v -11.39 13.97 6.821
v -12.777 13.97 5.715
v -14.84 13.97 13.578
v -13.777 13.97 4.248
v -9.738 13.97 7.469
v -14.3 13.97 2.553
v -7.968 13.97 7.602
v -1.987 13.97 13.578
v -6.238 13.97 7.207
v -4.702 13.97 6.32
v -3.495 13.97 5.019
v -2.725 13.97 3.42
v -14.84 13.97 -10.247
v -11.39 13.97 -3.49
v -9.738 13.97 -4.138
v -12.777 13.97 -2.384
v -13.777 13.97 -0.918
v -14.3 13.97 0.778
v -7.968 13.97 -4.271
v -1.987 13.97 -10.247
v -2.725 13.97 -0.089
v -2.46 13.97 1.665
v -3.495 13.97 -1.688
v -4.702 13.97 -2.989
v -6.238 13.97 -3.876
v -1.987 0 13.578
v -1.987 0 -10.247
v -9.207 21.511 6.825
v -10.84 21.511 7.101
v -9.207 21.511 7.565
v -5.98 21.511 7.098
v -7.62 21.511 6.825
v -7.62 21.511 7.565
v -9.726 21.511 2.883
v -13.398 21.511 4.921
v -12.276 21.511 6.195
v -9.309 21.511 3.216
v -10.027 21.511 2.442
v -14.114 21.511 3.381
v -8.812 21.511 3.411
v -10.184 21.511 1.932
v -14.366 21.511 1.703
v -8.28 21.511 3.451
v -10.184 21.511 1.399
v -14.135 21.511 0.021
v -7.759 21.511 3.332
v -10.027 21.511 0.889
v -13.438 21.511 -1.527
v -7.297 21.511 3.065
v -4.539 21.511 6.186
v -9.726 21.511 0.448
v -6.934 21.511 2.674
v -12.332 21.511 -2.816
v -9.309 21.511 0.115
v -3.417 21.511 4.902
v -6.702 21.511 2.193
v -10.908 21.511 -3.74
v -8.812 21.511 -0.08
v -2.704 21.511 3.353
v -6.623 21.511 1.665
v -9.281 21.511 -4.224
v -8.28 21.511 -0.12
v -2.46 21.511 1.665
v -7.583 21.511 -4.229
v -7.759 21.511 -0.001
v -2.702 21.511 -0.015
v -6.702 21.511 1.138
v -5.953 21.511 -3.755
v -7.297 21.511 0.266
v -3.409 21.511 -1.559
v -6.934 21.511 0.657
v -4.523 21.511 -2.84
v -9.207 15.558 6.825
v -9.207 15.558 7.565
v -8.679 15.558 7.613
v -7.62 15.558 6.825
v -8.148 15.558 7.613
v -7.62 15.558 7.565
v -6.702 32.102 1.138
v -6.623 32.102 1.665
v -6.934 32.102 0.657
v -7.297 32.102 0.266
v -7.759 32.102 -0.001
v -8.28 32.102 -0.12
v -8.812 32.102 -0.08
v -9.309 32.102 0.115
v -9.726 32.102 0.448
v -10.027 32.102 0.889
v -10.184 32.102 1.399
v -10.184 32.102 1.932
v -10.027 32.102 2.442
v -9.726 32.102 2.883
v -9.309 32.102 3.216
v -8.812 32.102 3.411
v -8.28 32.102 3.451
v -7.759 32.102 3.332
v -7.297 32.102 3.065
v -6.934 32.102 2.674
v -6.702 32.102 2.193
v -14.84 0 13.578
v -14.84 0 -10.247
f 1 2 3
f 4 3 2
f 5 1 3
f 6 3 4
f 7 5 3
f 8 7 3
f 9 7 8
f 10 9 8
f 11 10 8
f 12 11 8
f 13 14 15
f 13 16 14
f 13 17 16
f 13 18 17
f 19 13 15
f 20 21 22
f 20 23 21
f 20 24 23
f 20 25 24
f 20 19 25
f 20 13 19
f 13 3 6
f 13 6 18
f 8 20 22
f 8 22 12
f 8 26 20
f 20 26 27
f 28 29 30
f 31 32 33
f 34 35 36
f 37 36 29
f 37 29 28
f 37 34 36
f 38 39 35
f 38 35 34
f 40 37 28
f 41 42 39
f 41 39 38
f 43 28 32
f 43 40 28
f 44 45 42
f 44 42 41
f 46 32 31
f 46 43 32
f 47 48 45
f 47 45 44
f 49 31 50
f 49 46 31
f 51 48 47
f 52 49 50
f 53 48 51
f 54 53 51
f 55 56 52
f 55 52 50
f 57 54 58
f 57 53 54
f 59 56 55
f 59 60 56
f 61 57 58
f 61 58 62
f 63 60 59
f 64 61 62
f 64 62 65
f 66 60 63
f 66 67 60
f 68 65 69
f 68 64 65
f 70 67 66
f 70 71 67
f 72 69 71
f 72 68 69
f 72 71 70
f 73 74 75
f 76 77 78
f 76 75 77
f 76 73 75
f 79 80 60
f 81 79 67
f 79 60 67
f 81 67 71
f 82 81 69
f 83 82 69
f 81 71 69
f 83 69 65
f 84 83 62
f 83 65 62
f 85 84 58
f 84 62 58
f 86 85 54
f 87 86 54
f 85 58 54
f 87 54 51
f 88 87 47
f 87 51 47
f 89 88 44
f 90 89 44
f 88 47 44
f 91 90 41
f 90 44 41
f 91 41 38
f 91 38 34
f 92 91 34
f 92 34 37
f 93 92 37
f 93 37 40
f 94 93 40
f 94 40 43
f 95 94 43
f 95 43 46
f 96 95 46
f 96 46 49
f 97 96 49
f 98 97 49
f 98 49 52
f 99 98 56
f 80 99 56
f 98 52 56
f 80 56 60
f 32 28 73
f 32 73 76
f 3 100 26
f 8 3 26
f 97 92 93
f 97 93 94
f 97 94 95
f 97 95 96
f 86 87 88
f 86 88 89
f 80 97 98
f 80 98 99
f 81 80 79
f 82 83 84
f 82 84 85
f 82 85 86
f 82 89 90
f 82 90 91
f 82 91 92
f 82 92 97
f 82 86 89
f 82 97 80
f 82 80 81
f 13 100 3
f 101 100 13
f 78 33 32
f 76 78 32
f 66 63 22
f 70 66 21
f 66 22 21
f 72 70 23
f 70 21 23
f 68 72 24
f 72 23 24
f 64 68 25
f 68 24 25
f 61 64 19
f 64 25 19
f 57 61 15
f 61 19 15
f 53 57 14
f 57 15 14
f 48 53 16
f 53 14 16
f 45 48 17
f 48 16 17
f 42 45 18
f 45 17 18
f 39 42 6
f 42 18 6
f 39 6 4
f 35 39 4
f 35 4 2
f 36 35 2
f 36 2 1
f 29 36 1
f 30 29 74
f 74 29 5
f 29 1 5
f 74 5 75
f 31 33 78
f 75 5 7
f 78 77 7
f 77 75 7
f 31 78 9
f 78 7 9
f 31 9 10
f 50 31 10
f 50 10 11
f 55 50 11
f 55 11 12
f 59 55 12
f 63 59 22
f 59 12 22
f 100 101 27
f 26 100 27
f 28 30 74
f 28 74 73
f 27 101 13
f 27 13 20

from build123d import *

# Parameters (mm, degrees)
SKETCH1_W           = 12.8524
SKETCH1_H           = 23.8252
BOSS_EXTRUDE1_DEPTH = 13.97
SKETCH2_R           = 5.953125
BOSS_EXTRUDE2_DEPTH = 7.540625
SKETCH3_W           = 1.5875
SKETCH3_H           = 0.79375
CUT_EXTRUDE1_DEPTH  = 5.953125
SKETCH4_R           = 1.790559095
BOSS_EXTRUDE3_DEPTH = 10.5918


with BuildPart() as part:
    # Sketch1 → Boss-Extrude1 (new body)
    with BuildSketch(Plane(origin=(0, 0, 0), x_dir=(1, 0, 0), z_dir=(0, 1, 0))):
        with Locations((-8.41333272, -1.665416216)):
            Rectangle(SKETCH1_W, SKETCH1_H)
    extrude(amount=BOSS_EXTRUDE1_DEPTH)

    # Sketch2 → Boss-Extrude2 (add)
    with BuildSketch(Plane(origin=(0, 13.97, 0), x_dir=(1, 0, 0), z_dir=(0, 1, 0))):
        with Locations((-8.41333272, -1.665416216)):
            Circle(SKETCH2_R)
    extrude(amount=BOSS_EXTRUDE2_DEPTH)

    # Sketch3 → Cut-Extrude1 (cut)
    with BuildSketch(Plane(origin=(0, 21.510625, 0), x_dir=(1, 0, 0), z_dir=(0, 1, 0))):
        with Locations((-8.41333272, -7.221666216)):
            Rectangle(SKETCH3_W, SKETCH3_H)
    extrude(amount=-CUT_EXTRUDE1_DEPTH, mode=Mode.SUBTRACT)

    # Sketch4 → Boss-Extrude3 (add)
    with BuildSketch(Plane(origin=(0, 21.510625, 0), x_dir=(1, 0, 0), z_dir=(0, 1, 0))):
        with Locations((-8.41333272, -1.665416216)):
            Circle(SKETCH4_R)
    extrude(amount=BOSS_EXTRUDE3_DEPTH)


solid = part.part
